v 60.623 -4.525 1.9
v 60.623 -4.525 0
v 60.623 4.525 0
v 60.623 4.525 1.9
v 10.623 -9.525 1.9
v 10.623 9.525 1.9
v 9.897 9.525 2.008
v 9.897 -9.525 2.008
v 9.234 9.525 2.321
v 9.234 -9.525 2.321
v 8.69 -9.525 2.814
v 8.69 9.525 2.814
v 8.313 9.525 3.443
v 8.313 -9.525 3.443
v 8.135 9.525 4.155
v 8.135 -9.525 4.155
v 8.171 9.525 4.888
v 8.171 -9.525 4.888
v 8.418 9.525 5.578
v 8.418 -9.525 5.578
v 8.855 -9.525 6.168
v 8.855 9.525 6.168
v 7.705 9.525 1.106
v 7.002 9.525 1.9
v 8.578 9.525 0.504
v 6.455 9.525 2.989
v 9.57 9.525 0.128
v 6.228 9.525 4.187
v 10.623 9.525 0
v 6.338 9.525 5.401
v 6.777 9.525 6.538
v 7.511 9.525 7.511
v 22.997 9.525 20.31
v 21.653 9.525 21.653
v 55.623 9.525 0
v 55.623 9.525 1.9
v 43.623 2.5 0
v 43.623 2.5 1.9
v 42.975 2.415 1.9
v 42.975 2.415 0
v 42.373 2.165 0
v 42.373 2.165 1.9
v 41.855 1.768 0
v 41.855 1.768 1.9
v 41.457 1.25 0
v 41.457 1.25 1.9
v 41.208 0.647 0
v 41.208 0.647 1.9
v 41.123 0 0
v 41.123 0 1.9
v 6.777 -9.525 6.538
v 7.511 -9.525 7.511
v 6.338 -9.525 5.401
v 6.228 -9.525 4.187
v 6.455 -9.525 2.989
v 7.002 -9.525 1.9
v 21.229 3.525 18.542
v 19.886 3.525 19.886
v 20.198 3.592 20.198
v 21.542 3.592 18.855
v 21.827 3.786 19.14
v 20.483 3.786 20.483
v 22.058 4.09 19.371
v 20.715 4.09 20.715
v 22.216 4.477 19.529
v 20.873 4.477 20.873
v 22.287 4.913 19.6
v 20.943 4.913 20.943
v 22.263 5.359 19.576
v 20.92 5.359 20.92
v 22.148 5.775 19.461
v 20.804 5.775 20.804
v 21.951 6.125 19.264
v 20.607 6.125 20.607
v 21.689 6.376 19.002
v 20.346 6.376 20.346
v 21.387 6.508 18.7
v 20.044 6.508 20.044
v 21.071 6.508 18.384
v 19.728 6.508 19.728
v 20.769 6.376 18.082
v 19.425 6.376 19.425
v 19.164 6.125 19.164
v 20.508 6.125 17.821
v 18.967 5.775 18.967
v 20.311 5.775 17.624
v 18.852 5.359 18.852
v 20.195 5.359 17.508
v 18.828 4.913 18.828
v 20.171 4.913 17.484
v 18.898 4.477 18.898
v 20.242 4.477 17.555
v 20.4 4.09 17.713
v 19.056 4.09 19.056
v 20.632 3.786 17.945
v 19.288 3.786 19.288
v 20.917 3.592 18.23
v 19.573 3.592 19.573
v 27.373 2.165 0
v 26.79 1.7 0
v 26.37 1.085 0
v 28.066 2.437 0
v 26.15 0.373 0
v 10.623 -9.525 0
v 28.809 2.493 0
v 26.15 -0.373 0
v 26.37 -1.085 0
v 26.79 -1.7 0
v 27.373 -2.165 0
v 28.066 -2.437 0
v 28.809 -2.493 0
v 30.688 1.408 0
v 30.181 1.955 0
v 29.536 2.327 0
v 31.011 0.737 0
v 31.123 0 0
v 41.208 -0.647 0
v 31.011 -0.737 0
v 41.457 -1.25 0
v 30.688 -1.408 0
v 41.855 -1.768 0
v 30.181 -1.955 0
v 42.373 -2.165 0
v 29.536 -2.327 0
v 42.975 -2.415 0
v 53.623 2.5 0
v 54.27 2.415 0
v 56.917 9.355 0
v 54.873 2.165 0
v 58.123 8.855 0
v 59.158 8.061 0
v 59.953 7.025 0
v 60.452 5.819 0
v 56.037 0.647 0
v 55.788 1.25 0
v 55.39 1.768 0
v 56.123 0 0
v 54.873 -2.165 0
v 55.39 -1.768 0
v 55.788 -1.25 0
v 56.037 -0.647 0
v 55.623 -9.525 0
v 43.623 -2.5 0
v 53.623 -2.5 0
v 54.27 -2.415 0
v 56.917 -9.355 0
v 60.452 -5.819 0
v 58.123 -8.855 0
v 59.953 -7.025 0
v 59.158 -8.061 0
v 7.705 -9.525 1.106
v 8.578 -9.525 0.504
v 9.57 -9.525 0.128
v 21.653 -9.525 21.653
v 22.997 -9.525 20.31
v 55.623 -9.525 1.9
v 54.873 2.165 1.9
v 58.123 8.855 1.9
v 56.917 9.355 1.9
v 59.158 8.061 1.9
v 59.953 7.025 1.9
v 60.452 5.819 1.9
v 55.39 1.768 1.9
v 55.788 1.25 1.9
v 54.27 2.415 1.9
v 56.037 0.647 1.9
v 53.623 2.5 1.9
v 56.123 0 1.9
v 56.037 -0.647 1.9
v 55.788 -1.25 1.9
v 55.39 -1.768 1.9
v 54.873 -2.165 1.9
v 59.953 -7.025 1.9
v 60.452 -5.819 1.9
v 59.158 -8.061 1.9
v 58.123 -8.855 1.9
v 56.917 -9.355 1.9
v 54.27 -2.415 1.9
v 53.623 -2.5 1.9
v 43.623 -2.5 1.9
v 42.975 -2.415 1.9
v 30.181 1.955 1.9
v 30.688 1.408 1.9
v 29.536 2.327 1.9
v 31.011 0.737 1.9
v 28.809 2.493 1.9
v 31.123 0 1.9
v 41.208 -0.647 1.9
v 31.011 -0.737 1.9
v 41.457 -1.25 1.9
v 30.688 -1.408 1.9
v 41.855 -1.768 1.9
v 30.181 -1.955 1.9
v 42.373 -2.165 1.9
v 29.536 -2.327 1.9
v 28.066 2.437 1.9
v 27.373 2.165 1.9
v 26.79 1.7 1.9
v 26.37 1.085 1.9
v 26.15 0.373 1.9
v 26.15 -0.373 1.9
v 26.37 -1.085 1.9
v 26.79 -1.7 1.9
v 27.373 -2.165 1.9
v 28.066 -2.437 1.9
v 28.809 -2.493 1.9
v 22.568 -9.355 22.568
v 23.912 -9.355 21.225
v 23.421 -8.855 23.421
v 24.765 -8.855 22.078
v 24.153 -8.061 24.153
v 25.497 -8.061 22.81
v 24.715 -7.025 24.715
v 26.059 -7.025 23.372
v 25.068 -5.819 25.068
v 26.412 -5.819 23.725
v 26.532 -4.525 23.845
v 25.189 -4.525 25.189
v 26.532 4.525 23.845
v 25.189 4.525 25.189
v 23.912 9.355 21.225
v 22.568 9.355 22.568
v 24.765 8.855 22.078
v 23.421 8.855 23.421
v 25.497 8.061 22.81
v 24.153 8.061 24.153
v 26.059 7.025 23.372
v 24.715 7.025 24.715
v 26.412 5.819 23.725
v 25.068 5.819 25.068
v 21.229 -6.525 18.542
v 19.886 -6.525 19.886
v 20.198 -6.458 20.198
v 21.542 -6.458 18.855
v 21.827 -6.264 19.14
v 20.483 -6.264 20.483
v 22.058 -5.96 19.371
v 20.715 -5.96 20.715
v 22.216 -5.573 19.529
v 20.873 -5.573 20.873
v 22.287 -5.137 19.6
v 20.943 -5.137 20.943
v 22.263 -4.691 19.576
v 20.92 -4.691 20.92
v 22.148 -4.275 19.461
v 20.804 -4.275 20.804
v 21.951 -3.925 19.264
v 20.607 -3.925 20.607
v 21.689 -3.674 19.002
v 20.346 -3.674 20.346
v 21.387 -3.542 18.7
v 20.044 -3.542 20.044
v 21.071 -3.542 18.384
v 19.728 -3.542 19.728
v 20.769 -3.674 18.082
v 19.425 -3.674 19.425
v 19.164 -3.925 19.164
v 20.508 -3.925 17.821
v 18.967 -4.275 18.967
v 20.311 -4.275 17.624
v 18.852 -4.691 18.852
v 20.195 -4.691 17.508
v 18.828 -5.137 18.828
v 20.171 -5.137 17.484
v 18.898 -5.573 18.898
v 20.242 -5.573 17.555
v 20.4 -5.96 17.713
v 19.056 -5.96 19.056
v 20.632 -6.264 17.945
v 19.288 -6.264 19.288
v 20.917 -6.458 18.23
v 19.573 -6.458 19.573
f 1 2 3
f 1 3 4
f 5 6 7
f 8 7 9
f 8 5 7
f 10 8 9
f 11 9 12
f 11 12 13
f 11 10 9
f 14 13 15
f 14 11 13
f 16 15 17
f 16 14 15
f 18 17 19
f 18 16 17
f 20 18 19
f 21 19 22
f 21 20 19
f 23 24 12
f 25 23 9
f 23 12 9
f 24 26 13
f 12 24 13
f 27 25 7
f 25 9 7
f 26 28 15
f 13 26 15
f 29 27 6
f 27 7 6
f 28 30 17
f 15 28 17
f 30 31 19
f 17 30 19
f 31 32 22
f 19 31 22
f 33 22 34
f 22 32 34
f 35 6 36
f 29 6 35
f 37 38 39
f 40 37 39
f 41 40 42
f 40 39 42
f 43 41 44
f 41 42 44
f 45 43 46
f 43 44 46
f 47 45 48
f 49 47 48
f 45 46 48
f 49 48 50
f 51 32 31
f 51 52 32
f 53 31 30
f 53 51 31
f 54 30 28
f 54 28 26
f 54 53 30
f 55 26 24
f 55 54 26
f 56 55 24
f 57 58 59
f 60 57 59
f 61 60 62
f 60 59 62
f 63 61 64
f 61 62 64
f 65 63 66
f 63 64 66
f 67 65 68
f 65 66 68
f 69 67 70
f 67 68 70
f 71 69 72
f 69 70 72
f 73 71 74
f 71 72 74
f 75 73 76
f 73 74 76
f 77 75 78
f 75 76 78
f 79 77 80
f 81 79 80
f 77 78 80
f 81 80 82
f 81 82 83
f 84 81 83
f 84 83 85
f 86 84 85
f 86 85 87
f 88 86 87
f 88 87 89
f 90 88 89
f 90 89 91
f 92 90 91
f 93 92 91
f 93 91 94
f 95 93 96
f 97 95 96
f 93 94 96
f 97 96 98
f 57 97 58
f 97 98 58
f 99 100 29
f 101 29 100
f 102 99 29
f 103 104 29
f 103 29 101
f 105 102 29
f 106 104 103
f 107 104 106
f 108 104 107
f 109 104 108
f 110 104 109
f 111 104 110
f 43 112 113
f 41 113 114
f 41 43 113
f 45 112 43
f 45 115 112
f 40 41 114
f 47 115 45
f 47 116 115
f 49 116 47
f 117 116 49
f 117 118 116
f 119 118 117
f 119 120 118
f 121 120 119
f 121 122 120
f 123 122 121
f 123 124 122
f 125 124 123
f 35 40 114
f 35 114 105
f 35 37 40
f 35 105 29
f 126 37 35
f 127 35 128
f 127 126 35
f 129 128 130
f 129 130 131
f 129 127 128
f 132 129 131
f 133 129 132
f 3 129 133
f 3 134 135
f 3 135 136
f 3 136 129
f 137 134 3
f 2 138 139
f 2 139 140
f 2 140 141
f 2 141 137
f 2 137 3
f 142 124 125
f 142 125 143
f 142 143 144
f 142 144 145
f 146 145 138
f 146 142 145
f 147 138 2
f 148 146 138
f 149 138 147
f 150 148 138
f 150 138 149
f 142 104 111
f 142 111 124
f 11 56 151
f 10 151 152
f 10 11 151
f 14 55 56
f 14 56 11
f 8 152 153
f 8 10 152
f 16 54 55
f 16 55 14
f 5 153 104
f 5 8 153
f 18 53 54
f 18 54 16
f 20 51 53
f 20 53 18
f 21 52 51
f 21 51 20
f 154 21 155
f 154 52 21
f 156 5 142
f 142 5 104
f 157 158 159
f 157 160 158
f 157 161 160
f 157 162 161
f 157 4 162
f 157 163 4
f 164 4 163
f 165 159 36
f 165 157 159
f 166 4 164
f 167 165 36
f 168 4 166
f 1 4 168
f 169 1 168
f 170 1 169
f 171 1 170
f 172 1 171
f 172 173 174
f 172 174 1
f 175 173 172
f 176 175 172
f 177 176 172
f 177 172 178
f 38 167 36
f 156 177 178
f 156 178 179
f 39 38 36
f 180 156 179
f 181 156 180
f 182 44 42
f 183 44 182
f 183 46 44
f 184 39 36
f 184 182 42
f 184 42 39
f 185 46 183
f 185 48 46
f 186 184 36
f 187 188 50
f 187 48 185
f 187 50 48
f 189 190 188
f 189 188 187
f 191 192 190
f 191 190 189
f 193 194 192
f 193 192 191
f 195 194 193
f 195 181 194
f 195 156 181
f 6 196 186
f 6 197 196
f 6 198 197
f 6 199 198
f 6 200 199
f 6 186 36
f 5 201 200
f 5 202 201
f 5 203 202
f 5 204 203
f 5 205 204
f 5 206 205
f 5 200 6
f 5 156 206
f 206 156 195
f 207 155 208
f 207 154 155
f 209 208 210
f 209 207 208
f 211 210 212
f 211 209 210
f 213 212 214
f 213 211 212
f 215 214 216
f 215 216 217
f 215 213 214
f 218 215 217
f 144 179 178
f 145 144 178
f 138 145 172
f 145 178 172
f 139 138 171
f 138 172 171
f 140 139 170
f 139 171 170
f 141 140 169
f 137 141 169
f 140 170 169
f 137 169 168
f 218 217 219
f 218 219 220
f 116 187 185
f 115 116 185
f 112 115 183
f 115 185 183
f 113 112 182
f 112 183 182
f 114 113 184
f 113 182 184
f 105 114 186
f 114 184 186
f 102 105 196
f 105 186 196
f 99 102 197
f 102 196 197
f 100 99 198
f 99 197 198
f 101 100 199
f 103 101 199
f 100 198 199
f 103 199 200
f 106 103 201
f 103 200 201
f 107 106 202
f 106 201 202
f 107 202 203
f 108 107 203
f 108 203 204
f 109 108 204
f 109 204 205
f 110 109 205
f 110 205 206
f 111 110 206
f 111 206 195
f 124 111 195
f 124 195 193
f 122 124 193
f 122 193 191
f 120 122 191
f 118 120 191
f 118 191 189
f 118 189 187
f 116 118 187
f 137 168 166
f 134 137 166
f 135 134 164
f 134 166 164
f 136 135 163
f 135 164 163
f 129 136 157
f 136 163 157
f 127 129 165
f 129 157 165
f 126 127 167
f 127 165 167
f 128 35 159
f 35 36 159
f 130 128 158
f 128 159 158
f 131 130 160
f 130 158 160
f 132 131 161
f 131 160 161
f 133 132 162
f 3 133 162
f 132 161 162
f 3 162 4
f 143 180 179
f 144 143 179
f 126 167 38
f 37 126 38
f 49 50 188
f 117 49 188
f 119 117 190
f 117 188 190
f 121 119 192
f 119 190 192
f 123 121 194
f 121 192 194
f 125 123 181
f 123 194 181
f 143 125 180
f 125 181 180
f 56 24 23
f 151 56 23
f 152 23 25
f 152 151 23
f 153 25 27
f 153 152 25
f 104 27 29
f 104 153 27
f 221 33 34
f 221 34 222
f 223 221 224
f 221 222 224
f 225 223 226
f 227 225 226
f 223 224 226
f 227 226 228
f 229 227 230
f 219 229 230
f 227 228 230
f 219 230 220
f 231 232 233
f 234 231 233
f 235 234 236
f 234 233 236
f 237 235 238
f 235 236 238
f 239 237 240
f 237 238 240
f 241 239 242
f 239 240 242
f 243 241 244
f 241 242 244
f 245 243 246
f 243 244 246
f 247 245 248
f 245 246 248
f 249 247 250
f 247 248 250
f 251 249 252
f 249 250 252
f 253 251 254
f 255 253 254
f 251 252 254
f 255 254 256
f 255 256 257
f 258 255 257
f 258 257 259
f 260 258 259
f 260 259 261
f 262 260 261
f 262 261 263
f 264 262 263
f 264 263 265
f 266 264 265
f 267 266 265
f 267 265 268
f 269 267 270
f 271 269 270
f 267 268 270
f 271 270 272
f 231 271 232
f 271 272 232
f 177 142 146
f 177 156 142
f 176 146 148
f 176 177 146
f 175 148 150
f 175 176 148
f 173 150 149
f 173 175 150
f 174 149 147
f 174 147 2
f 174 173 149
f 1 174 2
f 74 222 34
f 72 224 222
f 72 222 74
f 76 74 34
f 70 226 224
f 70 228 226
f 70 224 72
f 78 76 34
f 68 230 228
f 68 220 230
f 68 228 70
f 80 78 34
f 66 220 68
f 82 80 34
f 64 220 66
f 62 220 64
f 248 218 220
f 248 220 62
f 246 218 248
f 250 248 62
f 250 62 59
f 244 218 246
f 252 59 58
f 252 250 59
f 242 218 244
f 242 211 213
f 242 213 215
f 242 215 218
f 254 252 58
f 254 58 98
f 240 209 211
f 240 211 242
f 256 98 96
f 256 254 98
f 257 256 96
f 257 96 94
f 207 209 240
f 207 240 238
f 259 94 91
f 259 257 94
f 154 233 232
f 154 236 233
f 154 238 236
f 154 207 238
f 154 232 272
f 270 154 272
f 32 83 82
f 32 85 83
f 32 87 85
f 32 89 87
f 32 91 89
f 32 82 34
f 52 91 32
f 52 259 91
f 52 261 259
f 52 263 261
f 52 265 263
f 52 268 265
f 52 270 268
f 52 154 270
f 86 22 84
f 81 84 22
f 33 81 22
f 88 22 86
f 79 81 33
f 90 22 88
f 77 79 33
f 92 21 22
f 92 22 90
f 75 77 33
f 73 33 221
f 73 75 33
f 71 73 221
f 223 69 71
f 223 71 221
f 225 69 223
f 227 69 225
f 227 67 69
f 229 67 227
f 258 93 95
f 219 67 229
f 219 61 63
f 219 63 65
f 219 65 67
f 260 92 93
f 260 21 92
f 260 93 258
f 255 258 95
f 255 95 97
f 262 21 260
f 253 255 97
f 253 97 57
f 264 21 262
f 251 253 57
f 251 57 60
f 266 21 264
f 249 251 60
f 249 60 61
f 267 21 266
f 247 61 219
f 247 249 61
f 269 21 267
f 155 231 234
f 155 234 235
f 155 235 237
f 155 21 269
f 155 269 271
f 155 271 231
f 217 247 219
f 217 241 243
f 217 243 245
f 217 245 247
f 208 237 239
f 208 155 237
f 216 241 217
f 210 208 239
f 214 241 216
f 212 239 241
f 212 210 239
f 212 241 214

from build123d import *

# Parameters (mm, degrees)
F1_DEPTH = 9.525
F2_R     = 2.5
F3_DEPTH = 1.901
F4_R     = 1.5
F5_DEPTH = 1.9
F6_R     = 5


with BuildPart() as f1:
    # F0 (on Front) → F1 (new body, symmetric)
    with BuildSketch(Plane.XZ):
        with BuildLine():
            ThreePointArc((7.001766, 1.9), (8.578035, 0.503848), (10.62254, 0))
            Line((10.62254, 0), (60.62254, 0))
            Line((60.62254, 0), (60.62254, 1.9))
            Line((60.62254, 1.9), (10.62254, 1.9))
            Line((10.62254, 1.9), (7.001766, 1.9))
        make_face()
        with BuildLine():
            ThreePointArc((7.51127, 7.51127), (6.240567, 4.797883), (7.001766, 1.9))
            Line((7.001766, 1.9), (10.62254, 1.9))
            ThreePointArc((10.62254, 1.9), (8.312841, 3.443291), (8.854773, 6.167767))
            Line((8.854773, 6.167767), (26.532442, 23.845436))
            Line((26.532442, 23.845436), (25.188939, 25.188939))
            Line((25.188939, 25.188939), (7.51127, 7.51127))
        make_face()
    extrude(amount=F1_DEPTH, both=True)

    # F2 (on face) → F3 (cut, through all)
    with BuildSketch(Plane.XY.offset(1.9)):
        with BuildLine():
            ThreePointArc((43.62254, -2.5), (45.390307, -1.767767), (46.12254, 0))
            Line((46.12254, 0), (41.12254, 0))
            ThreePointArc((41.12254, 0), (41.854773, -1.767767), (43.62254, -2.5))
        make_face()
        with BuildLine():
            ThreePointArc((43.62254, 2.5), (45.390307, 1.767767), (46.12254, 0))
            Line((46.12254, 0), (51.12254, 0))
            ThreePointArc((51.12254, 0), (51.854773, 1.767767), (53.62254, 2.5))
            Line((53.62254, 2.5), (43.62254, 2.5))
        make_face()
        with BuildLine():
            Line((41.12254, 0), (46.12254, 0))
            ThreePointArc((46.12254, 0), (45.390307, 1.767767), (43.62254, 2.5))
            ThreePointArc((43.62254, 2.5), (41.854773, 1.767767), (41.12254, 0))
        make_face()
        with BuildLine():
            Line((51.12254, 0), (46.12254, 0))
            ThreePointArc((46.12254, 0), (45.390307, -1.767767), (43.62254, -2.5))
            Line((43.62254, -2.5), (53.62254, -2.5))
            ThreePointArc((53.62254, -2.5), (51.854773, -1.767767), (51.12254, 0))
        make_face()
        with BuildLine():
            ThreePointArc((53.62254, 2.5), (51.854773, 1.767767), (51.12254, 0))
            Line((51.12254, 0), (56.12254, 0))
            ThreePointArc((56.12254, 0), (55.390307, 1.767767), (53.62254, 2.5))
        make_face()
        with BuildLine():
            Line((56.12254, 0), (51.12254, 0))
            ThreePointArc((51.12254, 0), (51.854773, -1.767767), (53.62254, -2.5))
            ThreePointArc((53.62254, -2.5), (55.390307, -1.767767), (56.12254, 0))
        make_face()
        with Locations((28.62254, 0)):
            Circle(F2_R)
    extrude(amount=-F3_DEPTH, mode=Mode.SUBTRACT)

    # F4 (on face) → F5 (cut, through all)
    with BuildSketch(Plane(origin=(0, 0, 0), x_dir=(0, -1, 0), z_dir=(-0.707107, 0, 0.707107))):
        with Locations((-5.025, 28.12254)):
            Circle(F4_R)
        with Locations((5.025, 28.12254)):
            Circle(F4_R)
    extrude(amount=-F5_DEPTH, mode=Mode.SUBTRACT)

    # F6
    f6_edges = [f1.edges().sort_by_distance(p)[0] for p in [
        (25.860691, 9.525, 24.517188),
        (25.860691, -9.525, 24.517188),
        (60.62254, -9.525, 0.95),
        (60.62254, 9.525, 0.95),
    ]]
    fillet(f6_edges, radius=F6_R)


solid = f1.part
